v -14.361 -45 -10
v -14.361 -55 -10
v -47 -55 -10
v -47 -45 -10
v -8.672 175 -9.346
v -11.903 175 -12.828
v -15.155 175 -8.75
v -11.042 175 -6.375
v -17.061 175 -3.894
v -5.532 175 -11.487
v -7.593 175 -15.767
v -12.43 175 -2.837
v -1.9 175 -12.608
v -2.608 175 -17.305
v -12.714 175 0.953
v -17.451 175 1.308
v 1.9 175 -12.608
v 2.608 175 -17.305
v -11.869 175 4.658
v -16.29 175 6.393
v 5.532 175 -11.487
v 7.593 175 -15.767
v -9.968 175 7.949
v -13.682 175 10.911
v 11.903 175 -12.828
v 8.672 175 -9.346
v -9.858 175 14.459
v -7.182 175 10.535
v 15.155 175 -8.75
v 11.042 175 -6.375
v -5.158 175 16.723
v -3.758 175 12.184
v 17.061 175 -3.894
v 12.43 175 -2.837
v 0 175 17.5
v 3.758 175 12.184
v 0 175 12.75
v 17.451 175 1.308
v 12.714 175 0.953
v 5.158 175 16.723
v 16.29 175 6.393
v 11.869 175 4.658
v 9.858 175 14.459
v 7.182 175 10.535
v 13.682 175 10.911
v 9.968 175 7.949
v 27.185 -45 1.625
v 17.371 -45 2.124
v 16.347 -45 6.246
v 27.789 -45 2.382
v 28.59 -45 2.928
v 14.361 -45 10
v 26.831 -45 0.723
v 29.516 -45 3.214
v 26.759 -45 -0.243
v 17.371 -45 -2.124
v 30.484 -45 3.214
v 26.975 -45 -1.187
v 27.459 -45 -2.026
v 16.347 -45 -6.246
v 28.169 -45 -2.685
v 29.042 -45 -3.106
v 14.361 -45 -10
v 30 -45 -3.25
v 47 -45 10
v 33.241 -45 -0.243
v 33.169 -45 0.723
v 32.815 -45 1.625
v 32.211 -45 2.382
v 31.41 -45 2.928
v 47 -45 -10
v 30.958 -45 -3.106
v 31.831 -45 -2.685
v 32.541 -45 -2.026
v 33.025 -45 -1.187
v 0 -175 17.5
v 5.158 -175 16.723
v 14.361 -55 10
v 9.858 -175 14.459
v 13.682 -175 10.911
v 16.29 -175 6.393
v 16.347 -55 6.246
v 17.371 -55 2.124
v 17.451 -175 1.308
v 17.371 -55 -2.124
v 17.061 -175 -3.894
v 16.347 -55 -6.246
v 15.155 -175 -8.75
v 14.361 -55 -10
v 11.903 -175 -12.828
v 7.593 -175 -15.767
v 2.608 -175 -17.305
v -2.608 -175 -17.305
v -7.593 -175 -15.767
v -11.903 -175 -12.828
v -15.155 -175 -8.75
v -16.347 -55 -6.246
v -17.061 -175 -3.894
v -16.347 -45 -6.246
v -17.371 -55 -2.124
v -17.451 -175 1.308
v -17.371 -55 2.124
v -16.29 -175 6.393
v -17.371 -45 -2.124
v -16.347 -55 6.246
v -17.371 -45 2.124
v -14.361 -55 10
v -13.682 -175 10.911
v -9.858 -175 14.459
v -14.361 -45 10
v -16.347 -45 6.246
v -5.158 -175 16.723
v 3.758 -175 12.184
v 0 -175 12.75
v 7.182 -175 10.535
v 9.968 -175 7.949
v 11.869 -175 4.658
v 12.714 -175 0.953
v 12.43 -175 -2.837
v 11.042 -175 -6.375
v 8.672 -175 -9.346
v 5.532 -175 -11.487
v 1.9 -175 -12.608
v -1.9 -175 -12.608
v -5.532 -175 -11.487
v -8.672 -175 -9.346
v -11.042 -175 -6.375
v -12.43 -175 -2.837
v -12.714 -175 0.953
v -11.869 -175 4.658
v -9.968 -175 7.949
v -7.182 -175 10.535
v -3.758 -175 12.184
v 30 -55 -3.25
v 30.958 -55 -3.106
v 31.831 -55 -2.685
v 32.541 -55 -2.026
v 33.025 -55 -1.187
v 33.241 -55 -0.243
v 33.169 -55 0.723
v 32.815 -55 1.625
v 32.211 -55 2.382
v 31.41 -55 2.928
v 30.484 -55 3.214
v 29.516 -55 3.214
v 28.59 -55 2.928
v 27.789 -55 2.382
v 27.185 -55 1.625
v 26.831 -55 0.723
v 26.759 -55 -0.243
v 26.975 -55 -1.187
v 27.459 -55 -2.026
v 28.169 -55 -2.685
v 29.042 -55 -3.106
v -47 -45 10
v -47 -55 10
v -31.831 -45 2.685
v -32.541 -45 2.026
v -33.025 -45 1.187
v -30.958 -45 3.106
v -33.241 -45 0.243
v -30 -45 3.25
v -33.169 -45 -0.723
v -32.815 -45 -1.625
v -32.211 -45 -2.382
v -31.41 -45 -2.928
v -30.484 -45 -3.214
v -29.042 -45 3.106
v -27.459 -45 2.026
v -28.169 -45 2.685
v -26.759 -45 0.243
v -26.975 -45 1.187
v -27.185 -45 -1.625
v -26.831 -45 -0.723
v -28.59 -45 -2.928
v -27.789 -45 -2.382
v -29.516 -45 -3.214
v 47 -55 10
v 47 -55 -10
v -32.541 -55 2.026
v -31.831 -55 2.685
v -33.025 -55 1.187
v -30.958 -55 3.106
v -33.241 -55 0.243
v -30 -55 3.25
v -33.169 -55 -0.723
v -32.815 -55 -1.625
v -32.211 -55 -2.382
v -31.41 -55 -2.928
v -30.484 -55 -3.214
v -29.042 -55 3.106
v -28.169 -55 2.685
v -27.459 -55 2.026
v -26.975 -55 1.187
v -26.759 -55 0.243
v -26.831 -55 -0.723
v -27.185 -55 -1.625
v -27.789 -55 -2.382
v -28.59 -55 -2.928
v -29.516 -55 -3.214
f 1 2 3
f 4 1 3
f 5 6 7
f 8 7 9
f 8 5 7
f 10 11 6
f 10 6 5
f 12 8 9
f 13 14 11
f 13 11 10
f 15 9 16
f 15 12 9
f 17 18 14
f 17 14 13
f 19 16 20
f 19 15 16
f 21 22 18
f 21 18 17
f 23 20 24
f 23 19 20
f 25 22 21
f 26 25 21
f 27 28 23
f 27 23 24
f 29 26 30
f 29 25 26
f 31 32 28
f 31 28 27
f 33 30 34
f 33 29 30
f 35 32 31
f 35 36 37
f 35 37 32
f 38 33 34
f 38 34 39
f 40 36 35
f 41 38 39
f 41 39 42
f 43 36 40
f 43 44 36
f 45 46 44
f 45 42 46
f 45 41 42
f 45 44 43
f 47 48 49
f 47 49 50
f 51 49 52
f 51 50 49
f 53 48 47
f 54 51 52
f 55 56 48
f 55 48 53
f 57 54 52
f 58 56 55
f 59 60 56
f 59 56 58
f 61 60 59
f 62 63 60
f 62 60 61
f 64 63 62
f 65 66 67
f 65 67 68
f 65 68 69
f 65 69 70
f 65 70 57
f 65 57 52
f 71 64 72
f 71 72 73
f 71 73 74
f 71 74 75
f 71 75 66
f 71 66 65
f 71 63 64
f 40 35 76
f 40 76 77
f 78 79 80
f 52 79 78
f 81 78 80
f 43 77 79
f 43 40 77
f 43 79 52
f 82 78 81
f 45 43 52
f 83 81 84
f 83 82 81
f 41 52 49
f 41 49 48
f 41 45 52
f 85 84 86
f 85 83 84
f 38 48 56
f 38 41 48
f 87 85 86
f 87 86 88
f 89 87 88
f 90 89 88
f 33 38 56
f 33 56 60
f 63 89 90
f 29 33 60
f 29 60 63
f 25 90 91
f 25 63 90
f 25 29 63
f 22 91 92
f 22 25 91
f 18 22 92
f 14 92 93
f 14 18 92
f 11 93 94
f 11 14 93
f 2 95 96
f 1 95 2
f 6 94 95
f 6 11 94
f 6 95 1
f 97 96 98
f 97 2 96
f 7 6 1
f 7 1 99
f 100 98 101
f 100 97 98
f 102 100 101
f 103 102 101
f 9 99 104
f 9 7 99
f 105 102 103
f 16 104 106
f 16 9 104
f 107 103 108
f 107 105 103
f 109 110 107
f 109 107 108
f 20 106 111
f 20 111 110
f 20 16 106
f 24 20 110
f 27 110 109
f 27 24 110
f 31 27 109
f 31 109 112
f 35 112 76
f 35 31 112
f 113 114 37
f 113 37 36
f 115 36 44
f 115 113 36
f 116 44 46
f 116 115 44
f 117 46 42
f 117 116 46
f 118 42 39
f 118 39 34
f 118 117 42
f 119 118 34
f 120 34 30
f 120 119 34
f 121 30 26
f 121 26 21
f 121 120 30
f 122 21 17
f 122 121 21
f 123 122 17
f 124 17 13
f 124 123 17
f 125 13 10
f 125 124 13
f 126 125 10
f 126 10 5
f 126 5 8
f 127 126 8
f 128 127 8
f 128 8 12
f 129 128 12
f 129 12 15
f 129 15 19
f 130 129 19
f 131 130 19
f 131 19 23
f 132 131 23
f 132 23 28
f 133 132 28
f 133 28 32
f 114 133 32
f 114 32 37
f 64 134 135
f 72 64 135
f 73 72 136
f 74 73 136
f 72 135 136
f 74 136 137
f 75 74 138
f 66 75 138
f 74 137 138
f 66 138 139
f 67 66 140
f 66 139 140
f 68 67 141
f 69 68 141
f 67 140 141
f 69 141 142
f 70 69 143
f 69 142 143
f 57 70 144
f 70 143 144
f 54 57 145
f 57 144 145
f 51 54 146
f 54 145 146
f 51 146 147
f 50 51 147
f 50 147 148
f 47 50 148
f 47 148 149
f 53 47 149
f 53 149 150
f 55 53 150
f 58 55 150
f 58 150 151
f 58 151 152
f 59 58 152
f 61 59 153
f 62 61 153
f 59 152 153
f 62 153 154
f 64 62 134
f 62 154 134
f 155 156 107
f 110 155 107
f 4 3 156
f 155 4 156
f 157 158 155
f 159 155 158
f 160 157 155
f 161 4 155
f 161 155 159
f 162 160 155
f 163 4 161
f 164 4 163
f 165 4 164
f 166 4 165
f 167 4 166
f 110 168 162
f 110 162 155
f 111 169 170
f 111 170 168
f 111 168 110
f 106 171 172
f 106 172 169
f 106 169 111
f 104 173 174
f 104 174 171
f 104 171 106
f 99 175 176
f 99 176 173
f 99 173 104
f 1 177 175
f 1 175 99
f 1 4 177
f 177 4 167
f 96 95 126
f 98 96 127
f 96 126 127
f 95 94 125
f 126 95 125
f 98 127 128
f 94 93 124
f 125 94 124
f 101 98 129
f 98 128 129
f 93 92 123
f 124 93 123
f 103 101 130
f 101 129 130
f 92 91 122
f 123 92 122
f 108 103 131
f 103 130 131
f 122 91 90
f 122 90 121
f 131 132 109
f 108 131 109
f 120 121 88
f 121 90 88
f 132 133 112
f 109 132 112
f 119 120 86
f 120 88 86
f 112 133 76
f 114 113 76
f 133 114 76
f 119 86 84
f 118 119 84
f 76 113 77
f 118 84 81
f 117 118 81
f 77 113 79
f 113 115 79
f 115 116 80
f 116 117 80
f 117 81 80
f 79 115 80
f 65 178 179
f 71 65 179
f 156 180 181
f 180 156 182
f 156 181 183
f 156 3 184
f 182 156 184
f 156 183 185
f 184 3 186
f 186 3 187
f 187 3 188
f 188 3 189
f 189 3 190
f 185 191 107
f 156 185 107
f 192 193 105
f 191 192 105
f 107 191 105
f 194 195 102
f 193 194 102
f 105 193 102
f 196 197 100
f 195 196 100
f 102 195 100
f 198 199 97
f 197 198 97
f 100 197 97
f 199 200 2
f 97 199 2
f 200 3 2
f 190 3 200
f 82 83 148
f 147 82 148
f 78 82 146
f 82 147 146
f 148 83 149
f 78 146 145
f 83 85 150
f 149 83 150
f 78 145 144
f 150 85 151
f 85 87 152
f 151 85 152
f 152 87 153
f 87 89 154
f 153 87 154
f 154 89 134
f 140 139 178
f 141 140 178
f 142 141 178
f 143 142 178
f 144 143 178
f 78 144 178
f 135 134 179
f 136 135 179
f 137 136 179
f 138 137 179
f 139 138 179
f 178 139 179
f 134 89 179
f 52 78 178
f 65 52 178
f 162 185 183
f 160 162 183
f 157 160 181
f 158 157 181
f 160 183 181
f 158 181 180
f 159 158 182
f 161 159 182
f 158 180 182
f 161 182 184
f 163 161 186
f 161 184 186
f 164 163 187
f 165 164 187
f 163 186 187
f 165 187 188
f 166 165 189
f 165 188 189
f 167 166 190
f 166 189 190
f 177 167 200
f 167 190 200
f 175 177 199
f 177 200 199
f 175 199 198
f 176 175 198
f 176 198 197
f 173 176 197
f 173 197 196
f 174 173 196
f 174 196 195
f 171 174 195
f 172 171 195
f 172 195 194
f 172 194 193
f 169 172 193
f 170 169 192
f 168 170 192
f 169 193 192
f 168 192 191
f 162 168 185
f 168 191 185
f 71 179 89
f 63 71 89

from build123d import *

# Parameters (mm, degrees)
SKETCH1_R           = 17.5
SKETCH1_R_2         = 12.75
BOSS_EXTRUDE1_DEPTH = 175
SKETCH3_R           = 3.25
BOSS_EXTRUDE2_DEPTH = 10


with BuildPart() as part:
    # Sketch1 → Boss-Extrude1 (new, symmetric)
    with BuildSketch(Plane(origin=(0, 0, 0), x_dir=(1, 0, 0), z_dir=(0, 1, 0))):
        with Locations(Location((0, 0, 0), (0, 0, 270))):
            Circle(SKETCH1_R)
        with Locations(Location((0, 0, 0), (0, 0, 270))):
            Circle(SKETCH1_R_2, mode=Mode.SUBTRACT)
    extrude(amount=BOSS_EXTRUDE1_DEPTH, both=True)

    # Sketch3 → Boss-Extrude2 (add)
    # profile 1 of 2: a face of its own
    with BuildSketch(Plane(origin=(0, -55, 0), x_dir=(-1, 0, 0), z_dir=(0, -1, 0))):
        with BuildLine():
            Line((47, -10), (7.90964601, -10))
            ThreePointArc((7.90964601, -10), (12.75, 0), (7.90964601, 10))
            Line((7.90964601, 10), (47, 10))
            Line((47, 10), (47, -10))
        make_face()
        with Locations(Location((30, 0, 0), (0, 0, 270))):
            Circle(SKETCH3_R, mode=Mode.SUBTRACT)
    # profile 2 of 2: a face of its own
    with BuildSketch(Plane(origin=(0, -55, 0), x_dir=(-1, 0, 0), z_dir=(0, -1, 0))):
        with BuildLine():
            Line((-47, -10), (-47, 10))
            Line((-47, 10), (-7.90964601, 10))
            ThreePointArc((-7.90964601, 10), (-12.75, 0), (-7.90964601, -10))
            Line((-7.90964601, -10), (-47, -10))
        make_face()
        with Locations(Location((-30, 0, 0), (0, 0, 90))):
            Circle(SKETCH3_R, mode=Mode.SUBTRACT)
    extrude(amount=-BOSS_EXTRUDE2_DEPTH)


solid = part.part
